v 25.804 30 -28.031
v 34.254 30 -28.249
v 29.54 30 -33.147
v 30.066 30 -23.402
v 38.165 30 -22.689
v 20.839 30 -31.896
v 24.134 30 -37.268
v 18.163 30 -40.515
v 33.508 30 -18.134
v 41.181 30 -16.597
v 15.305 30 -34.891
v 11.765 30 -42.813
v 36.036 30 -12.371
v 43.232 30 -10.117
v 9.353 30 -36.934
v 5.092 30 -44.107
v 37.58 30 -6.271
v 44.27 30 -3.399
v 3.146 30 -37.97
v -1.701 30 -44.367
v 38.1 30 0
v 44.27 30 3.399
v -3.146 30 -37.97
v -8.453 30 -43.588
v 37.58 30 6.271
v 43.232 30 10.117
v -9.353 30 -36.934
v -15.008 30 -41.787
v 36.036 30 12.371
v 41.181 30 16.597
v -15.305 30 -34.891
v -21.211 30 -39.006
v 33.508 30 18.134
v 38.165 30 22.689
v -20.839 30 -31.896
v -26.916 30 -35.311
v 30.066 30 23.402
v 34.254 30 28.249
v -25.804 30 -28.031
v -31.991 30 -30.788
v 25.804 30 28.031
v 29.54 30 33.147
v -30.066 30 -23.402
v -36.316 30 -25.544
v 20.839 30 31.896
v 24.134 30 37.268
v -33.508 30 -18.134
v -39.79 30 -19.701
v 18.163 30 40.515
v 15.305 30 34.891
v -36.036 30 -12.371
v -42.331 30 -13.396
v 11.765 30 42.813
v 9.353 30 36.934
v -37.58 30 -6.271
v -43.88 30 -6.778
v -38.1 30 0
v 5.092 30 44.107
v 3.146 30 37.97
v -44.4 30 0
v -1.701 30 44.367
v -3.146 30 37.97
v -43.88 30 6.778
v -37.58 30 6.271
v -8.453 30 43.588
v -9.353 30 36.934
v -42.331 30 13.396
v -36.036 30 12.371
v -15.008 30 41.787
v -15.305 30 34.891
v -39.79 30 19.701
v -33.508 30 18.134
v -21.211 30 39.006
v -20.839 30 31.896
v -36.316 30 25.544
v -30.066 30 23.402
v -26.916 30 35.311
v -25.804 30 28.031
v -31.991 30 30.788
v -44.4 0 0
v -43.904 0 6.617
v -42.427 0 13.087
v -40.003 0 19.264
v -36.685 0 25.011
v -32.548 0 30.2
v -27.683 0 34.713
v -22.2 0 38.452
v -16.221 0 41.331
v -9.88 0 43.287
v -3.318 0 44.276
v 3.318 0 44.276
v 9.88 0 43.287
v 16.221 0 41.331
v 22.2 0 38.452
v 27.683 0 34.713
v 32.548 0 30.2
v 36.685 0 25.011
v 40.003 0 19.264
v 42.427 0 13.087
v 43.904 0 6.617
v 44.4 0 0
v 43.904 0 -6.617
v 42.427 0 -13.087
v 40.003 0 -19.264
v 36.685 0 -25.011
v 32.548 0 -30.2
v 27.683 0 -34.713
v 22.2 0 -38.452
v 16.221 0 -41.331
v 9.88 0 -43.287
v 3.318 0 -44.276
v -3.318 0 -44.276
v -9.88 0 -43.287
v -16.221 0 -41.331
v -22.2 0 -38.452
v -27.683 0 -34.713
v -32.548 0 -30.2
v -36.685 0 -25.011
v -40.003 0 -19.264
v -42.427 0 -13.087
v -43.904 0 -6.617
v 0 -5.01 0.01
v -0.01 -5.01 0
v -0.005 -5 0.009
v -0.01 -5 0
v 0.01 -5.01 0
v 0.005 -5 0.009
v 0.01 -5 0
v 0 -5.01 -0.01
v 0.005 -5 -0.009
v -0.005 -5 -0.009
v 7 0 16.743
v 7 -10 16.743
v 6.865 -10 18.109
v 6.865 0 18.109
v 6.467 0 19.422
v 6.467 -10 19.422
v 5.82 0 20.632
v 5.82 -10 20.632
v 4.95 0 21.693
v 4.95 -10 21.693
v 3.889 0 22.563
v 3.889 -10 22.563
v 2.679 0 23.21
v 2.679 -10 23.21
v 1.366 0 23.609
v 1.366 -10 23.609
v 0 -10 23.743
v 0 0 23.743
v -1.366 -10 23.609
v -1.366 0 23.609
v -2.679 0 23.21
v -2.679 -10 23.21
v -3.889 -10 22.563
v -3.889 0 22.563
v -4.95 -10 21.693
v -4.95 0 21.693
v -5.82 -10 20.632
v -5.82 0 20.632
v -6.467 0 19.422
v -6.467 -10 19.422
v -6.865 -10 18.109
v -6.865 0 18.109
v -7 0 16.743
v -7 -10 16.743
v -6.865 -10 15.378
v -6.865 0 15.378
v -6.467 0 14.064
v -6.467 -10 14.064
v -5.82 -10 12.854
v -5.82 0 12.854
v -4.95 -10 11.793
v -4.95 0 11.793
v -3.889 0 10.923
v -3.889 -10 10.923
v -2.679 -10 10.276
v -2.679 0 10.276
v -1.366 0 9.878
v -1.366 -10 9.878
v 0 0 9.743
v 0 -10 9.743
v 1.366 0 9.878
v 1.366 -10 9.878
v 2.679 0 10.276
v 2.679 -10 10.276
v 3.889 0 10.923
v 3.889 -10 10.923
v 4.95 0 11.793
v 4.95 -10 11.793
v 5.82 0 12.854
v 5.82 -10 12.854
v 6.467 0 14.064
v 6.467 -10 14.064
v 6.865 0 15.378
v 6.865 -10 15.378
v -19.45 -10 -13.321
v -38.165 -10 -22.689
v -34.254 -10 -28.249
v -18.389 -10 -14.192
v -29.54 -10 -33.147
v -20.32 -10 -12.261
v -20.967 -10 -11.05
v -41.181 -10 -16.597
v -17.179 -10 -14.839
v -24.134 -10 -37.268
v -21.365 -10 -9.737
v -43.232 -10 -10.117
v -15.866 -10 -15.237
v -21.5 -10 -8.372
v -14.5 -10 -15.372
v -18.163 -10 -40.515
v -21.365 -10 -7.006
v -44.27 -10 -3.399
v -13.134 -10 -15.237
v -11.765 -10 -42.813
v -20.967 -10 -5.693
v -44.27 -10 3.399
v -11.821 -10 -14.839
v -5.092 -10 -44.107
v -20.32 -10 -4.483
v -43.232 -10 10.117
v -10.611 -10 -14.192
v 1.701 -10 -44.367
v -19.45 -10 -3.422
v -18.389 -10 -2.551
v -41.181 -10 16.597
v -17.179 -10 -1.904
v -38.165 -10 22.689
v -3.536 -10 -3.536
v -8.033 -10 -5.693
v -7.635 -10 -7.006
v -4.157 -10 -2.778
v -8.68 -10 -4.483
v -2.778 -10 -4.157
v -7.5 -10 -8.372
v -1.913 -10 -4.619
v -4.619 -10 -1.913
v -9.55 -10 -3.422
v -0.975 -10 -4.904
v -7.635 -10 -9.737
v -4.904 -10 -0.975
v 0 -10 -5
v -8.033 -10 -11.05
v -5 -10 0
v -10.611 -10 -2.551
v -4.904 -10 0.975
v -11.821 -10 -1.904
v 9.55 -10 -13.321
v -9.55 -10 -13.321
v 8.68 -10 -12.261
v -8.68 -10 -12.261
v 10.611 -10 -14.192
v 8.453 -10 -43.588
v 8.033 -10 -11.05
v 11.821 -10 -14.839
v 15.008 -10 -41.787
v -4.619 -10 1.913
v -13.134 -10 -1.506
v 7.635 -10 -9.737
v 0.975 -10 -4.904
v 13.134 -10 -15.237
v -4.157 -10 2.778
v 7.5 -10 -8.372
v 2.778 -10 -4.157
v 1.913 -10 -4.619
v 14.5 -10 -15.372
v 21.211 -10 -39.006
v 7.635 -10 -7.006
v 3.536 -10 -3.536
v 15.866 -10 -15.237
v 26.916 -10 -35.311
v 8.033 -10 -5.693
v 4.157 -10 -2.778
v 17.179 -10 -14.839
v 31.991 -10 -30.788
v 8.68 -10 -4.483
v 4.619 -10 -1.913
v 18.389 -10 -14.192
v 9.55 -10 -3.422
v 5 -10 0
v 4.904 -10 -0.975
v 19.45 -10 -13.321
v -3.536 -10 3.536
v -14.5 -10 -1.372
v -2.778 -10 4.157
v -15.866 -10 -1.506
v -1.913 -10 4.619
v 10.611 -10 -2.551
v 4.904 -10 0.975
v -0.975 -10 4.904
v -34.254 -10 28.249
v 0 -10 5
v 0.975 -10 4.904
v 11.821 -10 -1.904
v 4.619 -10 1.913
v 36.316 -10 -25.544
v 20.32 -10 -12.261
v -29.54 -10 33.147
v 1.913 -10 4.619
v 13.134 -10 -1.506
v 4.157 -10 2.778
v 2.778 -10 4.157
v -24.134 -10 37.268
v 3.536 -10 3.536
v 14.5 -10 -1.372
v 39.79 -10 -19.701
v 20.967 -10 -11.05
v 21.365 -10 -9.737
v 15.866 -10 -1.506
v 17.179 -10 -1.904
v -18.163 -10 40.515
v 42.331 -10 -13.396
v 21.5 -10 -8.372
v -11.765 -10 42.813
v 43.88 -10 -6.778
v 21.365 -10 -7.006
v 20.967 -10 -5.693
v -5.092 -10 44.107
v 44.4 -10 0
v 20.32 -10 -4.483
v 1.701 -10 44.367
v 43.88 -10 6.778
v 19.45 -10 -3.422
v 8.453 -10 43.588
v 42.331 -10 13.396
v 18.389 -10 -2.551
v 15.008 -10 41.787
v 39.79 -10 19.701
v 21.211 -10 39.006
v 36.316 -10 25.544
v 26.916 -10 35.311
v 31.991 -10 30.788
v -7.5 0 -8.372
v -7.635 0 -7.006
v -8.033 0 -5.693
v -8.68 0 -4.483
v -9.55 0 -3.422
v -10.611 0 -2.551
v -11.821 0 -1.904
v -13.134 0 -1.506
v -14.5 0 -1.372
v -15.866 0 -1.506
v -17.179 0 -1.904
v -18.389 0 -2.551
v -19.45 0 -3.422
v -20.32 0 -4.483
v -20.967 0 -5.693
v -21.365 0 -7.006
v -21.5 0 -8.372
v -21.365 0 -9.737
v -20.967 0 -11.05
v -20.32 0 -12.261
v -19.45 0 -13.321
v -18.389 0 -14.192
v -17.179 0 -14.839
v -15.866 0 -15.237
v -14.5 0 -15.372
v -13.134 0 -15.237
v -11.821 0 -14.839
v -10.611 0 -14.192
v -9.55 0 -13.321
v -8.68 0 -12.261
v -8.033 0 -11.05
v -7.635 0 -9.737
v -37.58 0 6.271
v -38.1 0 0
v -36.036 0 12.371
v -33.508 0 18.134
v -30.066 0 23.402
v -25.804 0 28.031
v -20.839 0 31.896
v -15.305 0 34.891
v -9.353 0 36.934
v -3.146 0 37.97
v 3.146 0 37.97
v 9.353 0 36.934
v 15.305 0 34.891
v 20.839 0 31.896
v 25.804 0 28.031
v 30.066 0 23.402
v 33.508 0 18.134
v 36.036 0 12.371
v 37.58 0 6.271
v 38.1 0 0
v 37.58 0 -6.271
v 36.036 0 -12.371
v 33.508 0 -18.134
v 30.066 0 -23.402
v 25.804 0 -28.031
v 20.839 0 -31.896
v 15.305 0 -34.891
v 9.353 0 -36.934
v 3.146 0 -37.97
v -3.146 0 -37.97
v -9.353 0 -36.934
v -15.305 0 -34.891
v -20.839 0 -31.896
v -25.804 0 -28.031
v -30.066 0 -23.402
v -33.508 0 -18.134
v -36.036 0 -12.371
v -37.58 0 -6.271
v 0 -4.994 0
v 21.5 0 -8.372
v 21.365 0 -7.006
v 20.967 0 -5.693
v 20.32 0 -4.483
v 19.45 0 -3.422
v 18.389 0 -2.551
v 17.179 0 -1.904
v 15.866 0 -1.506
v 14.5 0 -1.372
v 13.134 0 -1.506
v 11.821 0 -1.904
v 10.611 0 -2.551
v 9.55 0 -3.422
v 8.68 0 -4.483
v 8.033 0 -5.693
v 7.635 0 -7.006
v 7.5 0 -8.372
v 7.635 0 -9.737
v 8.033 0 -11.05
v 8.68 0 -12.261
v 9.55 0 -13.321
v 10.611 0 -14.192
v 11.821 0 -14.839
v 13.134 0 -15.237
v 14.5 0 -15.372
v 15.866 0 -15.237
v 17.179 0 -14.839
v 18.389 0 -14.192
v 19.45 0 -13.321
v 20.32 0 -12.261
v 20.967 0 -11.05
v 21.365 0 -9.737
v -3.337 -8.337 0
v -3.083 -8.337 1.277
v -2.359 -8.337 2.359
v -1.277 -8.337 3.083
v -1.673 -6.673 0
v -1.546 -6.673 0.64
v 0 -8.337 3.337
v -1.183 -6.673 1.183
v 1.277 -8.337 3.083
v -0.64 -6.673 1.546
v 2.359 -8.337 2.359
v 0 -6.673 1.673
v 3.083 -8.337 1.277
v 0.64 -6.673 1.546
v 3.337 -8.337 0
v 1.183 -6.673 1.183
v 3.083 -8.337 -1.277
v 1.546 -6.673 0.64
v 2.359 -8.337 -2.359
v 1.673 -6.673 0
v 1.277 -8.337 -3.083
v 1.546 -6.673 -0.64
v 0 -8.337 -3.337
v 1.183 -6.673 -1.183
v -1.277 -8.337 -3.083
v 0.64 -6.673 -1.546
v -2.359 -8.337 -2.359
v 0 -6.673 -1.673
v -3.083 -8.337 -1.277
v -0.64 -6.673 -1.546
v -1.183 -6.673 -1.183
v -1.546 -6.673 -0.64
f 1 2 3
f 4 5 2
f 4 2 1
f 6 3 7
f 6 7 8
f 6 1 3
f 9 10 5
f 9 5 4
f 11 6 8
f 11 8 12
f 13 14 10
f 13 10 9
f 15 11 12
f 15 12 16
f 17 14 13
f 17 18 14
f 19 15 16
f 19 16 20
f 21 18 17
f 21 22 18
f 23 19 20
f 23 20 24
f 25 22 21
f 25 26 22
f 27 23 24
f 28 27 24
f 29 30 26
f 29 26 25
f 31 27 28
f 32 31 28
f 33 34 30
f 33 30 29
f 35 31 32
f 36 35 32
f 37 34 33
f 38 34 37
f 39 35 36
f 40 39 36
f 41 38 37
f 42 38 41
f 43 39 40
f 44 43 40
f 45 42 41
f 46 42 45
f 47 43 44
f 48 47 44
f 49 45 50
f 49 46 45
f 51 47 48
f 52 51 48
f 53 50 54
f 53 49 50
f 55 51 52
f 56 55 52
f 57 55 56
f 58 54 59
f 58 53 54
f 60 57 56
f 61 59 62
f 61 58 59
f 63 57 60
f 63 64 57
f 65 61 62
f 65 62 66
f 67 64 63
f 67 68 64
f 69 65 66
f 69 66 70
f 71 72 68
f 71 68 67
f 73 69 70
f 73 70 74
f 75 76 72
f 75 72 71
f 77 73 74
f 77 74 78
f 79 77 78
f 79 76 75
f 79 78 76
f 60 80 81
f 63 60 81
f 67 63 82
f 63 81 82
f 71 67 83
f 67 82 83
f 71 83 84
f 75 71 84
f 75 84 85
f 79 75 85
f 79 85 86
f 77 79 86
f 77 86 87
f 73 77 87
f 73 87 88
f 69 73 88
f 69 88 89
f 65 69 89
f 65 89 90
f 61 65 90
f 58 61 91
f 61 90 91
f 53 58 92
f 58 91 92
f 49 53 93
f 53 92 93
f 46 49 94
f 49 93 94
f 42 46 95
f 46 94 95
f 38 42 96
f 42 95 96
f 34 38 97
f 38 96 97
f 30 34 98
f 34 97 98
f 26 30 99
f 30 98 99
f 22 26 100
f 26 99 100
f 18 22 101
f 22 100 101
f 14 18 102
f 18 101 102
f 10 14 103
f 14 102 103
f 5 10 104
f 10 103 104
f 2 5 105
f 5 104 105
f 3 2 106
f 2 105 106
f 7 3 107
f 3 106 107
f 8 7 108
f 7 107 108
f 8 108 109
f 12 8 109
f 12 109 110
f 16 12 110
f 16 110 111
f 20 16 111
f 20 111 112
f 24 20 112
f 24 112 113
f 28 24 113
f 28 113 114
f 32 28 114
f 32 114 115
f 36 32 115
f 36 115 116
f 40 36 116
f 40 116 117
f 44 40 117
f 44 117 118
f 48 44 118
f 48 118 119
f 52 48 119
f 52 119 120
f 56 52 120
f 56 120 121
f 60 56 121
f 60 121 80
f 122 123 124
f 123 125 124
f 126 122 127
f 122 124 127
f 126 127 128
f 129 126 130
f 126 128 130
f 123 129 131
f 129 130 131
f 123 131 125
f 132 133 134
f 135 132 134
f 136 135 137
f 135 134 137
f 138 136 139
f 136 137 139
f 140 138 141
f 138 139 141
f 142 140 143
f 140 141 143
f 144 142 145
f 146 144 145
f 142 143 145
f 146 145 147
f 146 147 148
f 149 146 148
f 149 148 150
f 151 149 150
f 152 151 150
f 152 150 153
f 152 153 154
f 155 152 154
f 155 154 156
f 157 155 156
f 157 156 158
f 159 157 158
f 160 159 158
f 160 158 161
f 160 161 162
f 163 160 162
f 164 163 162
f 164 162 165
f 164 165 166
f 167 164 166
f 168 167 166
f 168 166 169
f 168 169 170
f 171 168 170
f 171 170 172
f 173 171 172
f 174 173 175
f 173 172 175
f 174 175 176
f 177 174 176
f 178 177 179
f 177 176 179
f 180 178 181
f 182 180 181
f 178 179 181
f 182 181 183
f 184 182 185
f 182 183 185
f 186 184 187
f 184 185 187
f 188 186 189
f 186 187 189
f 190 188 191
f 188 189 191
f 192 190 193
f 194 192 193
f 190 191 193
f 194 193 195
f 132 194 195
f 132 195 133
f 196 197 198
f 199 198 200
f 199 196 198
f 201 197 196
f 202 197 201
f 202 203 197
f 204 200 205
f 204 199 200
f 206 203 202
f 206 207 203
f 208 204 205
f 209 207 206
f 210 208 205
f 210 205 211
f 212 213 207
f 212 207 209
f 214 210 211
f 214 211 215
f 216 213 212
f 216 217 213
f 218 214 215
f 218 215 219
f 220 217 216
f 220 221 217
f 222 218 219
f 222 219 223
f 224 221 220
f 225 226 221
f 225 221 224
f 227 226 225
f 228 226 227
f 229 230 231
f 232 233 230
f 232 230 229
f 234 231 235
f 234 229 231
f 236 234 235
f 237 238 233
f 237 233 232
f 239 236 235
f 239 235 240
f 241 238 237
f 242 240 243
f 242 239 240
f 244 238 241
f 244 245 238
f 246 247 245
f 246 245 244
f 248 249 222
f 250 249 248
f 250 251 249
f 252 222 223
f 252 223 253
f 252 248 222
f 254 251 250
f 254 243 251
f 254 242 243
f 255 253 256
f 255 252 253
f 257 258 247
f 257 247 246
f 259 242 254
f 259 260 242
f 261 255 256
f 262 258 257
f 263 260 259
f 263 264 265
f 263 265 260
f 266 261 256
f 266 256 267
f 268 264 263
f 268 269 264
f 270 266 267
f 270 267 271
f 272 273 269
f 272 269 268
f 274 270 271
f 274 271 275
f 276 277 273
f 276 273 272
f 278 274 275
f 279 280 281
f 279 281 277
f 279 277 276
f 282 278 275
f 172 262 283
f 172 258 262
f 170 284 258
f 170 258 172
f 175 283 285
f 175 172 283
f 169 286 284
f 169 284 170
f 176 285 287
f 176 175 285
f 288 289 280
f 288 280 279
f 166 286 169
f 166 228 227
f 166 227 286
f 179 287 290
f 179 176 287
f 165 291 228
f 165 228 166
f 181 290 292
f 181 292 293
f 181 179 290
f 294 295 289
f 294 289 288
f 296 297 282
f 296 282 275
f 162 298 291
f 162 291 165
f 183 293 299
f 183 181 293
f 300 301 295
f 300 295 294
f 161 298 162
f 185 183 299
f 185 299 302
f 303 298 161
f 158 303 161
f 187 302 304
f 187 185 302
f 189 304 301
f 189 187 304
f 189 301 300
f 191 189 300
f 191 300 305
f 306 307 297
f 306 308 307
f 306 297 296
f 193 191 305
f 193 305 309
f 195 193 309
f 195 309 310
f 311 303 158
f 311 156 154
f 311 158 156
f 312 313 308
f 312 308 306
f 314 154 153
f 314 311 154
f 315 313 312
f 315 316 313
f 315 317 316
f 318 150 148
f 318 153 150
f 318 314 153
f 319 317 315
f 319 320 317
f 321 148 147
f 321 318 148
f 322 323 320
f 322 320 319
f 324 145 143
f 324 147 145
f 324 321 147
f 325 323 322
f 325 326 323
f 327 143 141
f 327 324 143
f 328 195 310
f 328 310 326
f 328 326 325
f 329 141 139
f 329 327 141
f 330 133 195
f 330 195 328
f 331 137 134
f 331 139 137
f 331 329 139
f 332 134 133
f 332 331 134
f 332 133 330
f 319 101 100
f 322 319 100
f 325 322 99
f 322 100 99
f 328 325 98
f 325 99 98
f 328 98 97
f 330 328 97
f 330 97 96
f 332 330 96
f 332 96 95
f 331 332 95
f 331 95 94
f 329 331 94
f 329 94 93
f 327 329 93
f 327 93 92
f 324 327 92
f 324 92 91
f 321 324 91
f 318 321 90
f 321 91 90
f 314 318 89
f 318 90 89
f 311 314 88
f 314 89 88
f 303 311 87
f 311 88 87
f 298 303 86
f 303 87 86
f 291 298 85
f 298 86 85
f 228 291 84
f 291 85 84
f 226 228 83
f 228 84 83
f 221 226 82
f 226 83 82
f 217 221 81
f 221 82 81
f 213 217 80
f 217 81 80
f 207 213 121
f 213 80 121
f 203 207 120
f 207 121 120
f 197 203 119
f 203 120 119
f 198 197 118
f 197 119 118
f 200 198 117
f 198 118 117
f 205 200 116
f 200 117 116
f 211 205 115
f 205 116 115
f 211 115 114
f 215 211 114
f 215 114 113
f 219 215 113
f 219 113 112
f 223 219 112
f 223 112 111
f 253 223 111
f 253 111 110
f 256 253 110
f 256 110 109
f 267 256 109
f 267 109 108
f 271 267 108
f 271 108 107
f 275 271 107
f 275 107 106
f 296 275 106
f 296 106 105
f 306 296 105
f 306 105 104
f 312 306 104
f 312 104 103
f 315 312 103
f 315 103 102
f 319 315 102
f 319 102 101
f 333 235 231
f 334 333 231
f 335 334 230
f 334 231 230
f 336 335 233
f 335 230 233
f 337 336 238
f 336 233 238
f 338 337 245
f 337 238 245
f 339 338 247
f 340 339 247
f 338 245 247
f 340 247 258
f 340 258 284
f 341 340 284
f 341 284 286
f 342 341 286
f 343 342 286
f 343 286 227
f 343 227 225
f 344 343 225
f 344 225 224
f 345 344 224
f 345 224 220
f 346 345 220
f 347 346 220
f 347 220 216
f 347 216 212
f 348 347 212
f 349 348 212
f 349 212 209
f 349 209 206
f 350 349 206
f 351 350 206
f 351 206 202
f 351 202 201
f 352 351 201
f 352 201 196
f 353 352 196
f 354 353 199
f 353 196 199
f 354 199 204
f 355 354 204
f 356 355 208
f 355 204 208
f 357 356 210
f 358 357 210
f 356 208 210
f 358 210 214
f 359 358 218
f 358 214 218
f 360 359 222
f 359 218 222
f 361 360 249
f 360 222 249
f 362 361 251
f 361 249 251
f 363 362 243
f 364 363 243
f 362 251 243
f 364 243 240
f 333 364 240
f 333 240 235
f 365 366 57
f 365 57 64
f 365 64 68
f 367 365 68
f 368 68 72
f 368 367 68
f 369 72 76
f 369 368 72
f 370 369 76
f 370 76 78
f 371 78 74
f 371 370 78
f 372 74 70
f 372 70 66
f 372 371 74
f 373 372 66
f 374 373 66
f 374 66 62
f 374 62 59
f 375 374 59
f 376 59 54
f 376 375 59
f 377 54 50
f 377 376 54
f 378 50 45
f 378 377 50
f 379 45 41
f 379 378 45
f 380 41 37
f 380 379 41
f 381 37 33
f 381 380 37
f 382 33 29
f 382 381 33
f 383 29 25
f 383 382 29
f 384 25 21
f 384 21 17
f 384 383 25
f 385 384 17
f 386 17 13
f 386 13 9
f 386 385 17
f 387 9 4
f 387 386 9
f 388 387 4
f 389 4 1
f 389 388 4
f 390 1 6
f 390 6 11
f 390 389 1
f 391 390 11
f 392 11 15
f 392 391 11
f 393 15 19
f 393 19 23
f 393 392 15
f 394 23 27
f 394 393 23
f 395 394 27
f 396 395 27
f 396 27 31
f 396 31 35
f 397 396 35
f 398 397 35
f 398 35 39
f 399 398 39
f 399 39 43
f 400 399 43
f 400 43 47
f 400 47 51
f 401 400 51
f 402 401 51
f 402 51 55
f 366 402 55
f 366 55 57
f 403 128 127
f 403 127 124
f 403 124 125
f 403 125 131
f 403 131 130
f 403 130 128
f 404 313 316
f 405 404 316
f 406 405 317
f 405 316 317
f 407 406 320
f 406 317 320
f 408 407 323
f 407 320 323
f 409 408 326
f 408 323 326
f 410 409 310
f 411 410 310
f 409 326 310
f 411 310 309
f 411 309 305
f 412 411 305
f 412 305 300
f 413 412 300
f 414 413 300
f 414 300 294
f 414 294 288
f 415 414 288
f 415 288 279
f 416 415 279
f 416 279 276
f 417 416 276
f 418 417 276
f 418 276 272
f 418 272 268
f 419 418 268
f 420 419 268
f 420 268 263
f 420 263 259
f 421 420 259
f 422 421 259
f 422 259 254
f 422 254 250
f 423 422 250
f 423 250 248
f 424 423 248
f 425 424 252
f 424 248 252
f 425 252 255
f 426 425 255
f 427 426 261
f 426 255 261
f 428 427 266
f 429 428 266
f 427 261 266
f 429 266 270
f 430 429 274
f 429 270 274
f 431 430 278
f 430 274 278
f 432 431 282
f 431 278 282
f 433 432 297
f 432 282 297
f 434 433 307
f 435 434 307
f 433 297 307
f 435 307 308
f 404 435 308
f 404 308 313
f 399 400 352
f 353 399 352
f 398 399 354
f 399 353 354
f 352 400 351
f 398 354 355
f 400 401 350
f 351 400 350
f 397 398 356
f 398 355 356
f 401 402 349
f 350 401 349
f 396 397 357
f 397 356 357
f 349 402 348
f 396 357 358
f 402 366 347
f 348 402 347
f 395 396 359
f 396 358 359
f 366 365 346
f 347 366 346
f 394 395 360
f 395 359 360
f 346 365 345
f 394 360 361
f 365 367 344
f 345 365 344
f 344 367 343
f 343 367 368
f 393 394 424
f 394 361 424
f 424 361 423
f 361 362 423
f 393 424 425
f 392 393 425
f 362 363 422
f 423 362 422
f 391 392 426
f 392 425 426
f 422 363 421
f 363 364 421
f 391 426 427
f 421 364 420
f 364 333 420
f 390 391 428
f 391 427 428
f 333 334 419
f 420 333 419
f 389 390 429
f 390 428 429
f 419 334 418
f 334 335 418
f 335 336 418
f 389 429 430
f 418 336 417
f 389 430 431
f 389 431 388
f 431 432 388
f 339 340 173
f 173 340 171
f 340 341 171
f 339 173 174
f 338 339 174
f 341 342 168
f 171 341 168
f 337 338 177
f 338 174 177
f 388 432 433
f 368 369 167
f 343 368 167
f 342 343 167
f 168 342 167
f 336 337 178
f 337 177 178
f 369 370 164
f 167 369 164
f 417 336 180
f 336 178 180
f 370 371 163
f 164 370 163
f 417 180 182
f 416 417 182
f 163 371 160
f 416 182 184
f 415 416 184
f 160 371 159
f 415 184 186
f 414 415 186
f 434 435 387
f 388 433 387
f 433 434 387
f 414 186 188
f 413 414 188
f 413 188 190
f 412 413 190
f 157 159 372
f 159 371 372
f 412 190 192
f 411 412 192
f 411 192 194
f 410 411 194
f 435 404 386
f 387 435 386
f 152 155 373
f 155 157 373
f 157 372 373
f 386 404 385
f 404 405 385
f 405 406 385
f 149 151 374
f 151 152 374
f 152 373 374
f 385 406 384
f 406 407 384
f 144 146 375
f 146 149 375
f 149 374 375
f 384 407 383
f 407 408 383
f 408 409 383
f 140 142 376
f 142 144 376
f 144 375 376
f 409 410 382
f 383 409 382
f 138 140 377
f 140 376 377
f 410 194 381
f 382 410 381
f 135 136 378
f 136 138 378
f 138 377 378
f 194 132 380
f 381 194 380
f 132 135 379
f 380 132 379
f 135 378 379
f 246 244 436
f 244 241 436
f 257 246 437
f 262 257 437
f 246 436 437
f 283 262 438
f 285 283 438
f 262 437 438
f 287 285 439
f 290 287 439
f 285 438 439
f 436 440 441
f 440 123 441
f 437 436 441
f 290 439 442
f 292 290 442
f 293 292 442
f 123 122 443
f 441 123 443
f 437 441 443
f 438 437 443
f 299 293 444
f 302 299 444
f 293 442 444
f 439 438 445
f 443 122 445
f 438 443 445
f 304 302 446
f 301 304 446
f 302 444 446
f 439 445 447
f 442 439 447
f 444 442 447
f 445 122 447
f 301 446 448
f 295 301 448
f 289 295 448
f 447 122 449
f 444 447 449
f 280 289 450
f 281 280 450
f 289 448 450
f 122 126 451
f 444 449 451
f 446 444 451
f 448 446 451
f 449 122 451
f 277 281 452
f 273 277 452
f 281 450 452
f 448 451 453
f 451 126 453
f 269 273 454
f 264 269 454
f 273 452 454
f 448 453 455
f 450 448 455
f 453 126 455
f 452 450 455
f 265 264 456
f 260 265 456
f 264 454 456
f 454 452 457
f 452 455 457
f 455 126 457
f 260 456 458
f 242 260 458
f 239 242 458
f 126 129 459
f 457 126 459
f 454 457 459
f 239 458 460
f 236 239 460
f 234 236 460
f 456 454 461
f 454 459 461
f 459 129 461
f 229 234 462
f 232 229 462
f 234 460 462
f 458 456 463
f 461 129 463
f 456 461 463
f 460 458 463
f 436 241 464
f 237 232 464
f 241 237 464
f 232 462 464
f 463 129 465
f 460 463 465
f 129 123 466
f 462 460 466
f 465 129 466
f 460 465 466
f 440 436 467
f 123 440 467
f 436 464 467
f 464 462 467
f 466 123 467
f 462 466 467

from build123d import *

# Parameters (mm, degrees)
F0_R           = 44.4
F1_DEPTH       = 10
F2_R           = 44.4
F2_R_2         = 38.1
F3_DEPTH       = 30
F4_R           = 7
F5_DEPTH       = 40.001
F7_D           = 0.02
F7_DEPTH       = 5
F7_CSINK_D     = 10
F7_CSINK_ANGLE = 90
F7_TIP         = 0.0060086062


with BuildPart() as f1:
    # F0 (on Front) → F1 (new body)
    with BuildSketch(Plane.XZ):
        Circle(F0_R)
    extrude(amount=F1_DEPTH)

    # F2 (on face) → F3 (join)
    with BuildSketch(Plane(origin=(0, 0, 0), x_dir=(-1, 0, 0), z_dir=(0, 1, 0))):
        Circle(F2_R)
        Circle(F2_R_2, mode=Mode.SUBTRACT)
    extrude(amount=F3_DEPTH)

    # F4 (on face) → F5 (cut, through all)
    with BuildSketch(Plane.XZ.offset(10)):
        with Locations((0, 16.7431578065)):
            Circle(F4_R)
        with Locations((-14.5, -8.3715789032)):
            Circle(F4_R)
        with Locations((14.5, -8.3715789032)):
            Circle(F4_R)
    extrude(amount=-F5_DEPTH, mode=Mode.SUBTRACT)

    # F7
    with Locations(Plane.XZ.offset(10)):
        with Locations((0, 0)):
            CounterSinkHole(F7_D / 2, F7_CSINK_D / 2, depth=F7_DEPTH, counter_sink_angle=F7_CSINK_ANGLE)
            with Locations((0, 0, -(F7_DEPTH + F7_TIP / 2))):  # 118° drill point
                Cone(0, F7_D / 2, F7_TIP, mode=Mode.SUBTRACT)


solid = f1.part
